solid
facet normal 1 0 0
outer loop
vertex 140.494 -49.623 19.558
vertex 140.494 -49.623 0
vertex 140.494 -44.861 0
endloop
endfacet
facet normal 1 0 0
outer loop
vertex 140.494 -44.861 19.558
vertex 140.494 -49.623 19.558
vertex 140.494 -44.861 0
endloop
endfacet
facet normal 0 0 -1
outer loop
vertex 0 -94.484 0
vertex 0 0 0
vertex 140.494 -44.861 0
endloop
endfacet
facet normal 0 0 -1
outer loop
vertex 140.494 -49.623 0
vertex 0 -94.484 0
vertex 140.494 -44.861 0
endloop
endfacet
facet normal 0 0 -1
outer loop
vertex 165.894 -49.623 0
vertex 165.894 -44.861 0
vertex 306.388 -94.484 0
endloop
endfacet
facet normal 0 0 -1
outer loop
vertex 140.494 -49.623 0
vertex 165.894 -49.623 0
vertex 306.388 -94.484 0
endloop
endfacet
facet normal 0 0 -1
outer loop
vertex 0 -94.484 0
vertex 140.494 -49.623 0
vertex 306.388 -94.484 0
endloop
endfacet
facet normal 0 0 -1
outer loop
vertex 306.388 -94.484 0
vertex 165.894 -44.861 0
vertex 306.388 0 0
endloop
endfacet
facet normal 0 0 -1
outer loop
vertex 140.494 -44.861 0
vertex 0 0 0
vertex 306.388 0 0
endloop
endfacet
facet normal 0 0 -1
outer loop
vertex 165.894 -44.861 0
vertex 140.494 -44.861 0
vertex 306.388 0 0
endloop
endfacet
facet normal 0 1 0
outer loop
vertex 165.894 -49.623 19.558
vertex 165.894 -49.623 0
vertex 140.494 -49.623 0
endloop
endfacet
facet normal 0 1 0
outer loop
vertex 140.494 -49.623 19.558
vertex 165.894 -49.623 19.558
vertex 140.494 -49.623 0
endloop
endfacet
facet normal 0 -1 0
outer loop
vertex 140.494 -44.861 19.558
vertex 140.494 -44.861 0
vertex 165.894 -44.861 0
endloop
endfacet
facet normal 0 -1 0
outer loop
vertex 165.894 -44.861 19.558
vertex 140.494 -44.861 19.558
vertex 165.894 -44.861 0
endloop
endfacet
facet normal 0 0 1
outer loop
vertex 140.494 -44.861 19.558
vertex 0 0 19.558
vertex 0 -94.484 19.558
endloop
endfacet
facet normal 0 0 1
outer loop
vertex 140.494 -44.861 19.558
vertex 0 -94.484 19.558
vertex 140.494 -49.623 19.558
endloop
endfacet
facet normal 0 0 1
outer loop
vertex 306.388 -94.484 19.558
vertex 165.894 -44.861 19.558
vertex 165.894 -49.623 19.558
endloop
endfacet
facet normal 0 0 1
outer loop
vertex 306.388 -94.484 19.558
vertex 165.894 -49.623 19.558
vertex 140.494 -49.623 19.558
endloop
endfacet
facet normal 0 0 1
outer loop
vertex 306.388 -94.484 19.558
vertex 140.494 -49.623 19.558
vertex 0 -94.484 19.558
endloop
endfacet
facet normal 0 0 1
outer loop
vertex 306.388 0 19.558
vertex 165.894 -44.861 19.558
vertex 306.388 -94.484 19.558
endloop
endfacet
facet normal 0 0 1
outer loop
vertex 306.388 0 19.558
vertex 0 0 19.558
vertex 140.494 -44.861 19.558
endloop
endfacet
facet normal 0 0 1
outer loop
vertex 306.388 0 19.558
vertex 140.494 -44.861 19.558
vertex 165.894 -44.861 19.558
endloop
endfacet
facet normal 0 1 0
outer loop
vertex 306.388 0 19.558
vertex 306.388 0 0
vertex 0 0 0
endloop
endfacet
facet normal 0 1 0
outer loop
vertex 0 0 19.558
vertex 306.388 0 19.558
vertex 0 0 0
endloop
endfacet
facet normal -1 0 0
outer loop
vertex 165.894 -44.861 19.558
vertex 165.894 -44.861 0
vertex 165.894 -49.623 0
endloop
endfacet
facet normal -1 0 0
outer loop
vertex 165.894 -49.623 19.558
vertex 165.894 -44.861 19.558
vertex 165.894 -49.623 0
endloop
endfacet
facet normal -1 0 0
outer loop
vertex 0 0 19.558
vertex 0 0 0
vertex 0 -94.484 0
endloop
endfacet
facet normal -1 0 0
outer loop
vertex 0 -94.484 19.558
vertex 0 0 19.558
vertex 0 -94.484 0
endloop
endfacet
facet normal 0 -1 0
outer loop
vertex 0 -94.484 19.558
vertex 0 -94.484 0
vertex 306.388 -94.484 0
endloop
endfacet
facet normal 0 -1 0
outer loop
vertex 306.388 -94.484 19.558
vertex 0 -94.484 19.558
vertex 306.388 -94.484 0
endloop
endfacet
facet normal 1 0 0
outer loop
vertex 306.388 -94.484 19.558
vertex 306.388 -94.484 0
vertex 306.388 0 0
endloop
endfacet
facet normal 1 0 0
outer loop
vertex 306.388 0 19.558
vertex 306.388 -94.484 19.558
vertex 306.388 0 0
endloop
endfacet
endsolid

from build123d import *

# Parameters (mm, degrees)
F1_DEPTH = 19.558


with BuildPart() as f1:
    # F0 (on Top) → F1 (new body)
    with BuildSketch(Plane.XY):
        Polygon((91.65114, 0), (0, 0), (0, -94.483525), (306.3875, -94.483525), (306.3875, 0), align=None)
        Polygon((165.89375, -49.623013), (153.19375, -49.623013), (140.49375, -49.623013), (140.49375, -44.860513), (153.19375, -44.860513), (165.89375, -44.860513), align=None, mode=Mode.SUBTRACT)
    extrude(amount=F1_DEPTH)


solid = f1.part
